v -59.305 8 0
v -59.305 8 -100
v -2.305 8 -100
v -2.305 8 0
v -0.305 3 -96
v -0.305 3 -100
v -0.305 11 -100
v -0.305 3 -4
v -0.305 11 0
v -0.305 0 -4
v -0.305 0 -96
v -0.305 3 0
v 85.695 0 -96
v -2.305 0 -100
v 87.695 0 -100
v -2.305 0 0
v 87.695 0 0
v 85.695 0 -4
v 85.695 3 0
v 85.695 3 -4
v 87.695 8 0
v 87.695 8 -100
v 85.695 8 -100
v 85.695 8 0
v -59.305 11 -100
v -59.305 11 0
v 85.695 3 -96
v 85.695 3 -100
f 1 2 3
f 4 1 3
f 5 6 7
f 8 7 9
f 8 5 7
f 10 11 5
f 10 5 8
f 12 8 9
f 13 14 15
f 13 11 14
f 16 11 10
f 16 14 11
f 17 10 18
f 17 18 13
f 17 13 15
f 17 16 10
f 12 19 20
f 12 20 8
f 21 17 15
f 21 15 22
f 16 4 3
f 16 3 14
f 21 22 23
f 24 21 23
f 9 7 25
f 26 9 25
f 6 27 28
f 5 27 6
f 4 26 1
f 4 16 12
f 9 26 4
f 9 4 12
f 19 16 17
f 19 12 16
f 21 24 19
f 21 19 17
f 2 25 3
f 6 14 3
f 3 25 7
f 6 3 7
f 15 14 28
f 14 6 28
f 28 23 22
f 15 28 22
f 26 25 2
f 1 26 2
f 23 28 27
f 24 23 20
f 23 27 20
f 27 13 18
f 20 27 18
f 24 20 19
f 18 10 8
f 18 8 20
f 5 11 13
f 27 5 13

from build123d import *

# Parameters (mm, degrees)
F2_DEPTH = 100
F3_W     = 86
F3_H     = 92
F4_DEPTH = 3


# Not quite as in the source:
# - the program builds the solid bodies; features that only make, move or delete a surface that nothing else refers to are left out


with BuildPart() as f2:
    # F0 (on Top) → F2 (new body)
    with BuildSketch(Plane.XY):
        Polygon((-2.3052925244, 0), (87.6947074756, 0), (87.6947074756, 8), (85.6947074756, 8), (85.6947074756, 3), (-0.3052925244, 3), (-0.3052925244, 11), (-59.3052925244, 11), (-59.3052925244, 8), (-2.3052925244, 8), (-2.3052925244, 3), align=None)
    extrude(amount=-F2_DEPTH)

    # F3 (on Front) → F4 (cut)
    with BuildSketch(Plane.XZ):
        with Locations((42.6947074756, -50)):
            Rectangle(F3_W, F3_H)
    extrude(amount=-F4_DEPTH, mode=Mode.SUBTRACT)


solid = f2.part
